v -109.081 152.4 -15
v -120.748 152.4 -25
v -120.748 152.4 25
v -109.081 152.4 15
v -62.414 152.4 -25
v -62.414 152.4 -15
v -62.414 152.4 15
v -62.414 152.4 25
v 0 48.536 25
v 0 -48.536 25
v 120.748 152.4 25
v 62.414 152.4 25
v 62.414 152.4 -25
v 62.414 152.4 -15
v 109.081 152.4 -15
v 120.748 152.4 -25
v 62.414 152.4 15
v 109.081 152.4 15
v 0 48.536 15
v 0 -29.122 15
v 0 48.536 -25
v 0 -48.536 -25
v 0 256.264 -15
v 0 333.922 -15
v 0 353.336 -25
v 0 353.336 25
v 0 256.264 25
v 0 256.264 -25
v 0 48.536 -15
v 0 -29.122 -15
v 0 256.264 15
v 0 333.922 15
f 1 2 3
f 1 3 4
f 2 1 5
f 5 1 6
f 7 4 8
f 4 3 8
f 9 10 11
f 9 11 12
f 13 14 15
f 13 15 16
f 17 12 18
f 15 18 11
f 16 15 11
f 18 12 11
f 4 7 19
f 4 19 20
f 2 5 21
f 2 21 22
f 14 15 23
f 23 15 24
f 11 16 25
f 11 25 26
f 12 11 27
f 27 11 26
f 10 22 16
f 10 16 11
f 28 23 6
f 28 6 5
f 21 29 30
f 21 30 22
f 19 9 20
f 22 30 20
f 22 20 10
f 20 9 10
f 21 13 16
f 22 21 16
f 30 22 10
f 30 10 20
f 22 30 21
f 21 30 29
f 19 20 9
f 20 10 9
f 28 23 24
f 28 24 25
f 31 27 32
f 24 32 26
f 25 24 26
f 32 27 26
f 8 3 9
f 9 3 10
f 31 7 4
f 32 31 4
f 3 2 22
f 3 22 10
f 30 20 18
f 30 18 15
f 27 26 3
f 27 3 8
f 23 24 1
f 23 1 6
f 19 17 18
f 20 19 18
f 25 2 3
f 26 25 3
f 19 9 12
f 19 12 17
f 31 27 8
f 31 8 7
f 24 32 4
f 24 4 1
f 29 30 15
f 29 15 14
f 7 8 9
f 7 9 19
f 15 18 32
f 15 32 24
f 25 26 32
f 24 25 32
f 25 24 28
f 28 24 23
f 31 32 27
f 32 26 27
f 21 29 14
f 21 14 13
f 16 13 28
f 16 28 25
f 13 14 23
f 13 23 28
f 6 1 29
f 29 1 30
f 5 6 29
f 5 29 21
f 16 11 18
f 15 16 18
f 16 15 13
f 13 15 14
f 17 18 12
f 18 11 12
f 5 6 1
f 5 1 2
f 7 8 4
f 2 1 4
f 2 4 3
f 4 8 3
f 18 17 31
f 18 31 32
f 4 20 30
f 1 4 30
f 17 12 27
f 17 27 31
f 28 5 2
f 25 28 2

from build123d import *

# Parameters (mm, degrees)
BUILDING_C_CHANEL_1_DEPTH      = 237.634840541
BUILDING_C_CHANEL_1_DEPTH_BACK = 22.24591464
BUILDING_C_CHANEL_1_2_DEPTH    = 259.880755181
BUILDING_C_CHANEL_1_3_DEPTH    = 259.880755181
BUILDING_C_CHANEL_1_4_DEPTH    = 259.880755181


with BuildPart() as part:
    # Sketch2 → Building C CHANEL(1) (new, two sides: drawn at the far end of the back side and taken through both)
    with BuildSketch(Plane(origin=(-91.581002397, 152.4, 0), x_dir=(0, 0, 1), z_dir=(0.5150787536377126, 0.8571428571428572, 0)).offset(-BUILDING_C_CHANEL_1_DEPTH_BACK)):
        Polygon((-25, 25), (-25, -25), (25, -25), (25, 25), (15, 25), (15, -15), (-15, -15), (-15, 25), align=None)
    extrude(amount=BUILDING_C_CHANEL_1_DEPTH + BUILDING_C_CHANEL_1_DEPTH_BACK)

    # Building C CHANEL(1) mitre 1
    split(bisect_by=Plane(origin=(-91.581002397, 152.4, 0), x_dir=(-1, 0, 0), z_dir=(0, 1, 0)), keep=Keep.TOP)

    # Building C CHANEL(1) mitre 2
    split(bisect_by=Plane(origin=(0, 304.8, 0), x_dir=(0, -1, 0), z_dir=(-1, 0, 0)), keep=Keep.TOP)


with BuildPart() as body_2:
    # Sketch2 on segment 2 (carried to segment 2) → Building C CHANEL_1 2 (new body)
    with BuildSketch(Plane(origin=(-30.81965509, 356.087006178, 0), x_dir=(0, 0, 1), z_dir=(0.515078754, -0.857142857, 0))):
        Polygon((-25, 25), (-25, -25), (25, -25), (25, 25), (15, 25), (15, -15), (-15, -15), (-15, 25), align=None)
    extrude(amount=BUILDING_C_CHANEL_1_2_DEPTH)

    # Building C CHANEL_1 2 mitre 1
    split(bisect_by=Plane(origin=(0, 304.8, 0), x_dir=(0, 1, 0), z_dir=(1, 0, 0)), keep=Keep.TOP)

    # Building C CHANEL_1 2 mitre 2
    split(bisect_by=Plane(origin=(91.581002397, 152.4, 0), x_dir=(-1, 0, 0), z_dir=(0, 1, 0)), keep=Keep.TOP)


with BuildPart() as body_3:
    # Sketch2 on segment 3 (carried to segment 3) → Building C CHANEL_1 3 (new body)
    with BuildSketch(Plane(origin=(103.039400383, 171.467926834, 0), x_dir=(0, 0, 1), z_dir=(-0.515078754, -0.857142857, 0))):
        Polygon((-25, 25), (-25, -25), (25, -25), (25, 25), (15, 25), (15, -15), (-15, -15), (-15, 25), align=None)
    extrude(amount=BUILDING_C_CHANEL_1_3_DEPTH)

    # Building C CHANEL_1 3 mitre 1
    split(bisect_by=Plane(origin=(91.581002397, 152.4, 0), x_dir=(1, 0, 0), z_dir=(0, -1, 0)), keep=Keep.TOP)

    # Building C CHANEL_1 3 mitre 2
    split(bisect_by=Plane.YZ, keep=Keep.TOP)


with BuildPart() as body_4:
    # Sketch2 on segment 4 (carried to segment 4) → Building C CHANEL_1 4 (new body)
    with BuildSketch(Plane(origin=(30.81965509, -51.287006178, 0), x_dir=(0, 0, 1), z_dir=(-0.515078754, 0.857142857, 0))):
        Polygon((-25, 25), (-25, -25), (25, -25), (25, 25), (15, 25), (15, -15), (-15, -15), (-15, 25), align=None)
    extrude(amount=BUILDING_C_CHANEL_1_4_DEPTH)

    # Building C CHANEL_1 4 mitre 1
    split(bisect_by=Plane(origin=(0, 0, 0), x_dir=(0, -1, 0), z_dir=(-1, 0, 0)), keep=Keep.TOP)

    # Building C CHANEL_1 4 mitre 2
    split(bisect_by=Plane(origin=(-91.581002397, 152.4, 0), x_dir=(1, 0, 0), z_dir=(0, -1, 0)), keep=Keep.TOP)


solid = Compound([part.part, body_2.part, body_3.part, body_4.part])
